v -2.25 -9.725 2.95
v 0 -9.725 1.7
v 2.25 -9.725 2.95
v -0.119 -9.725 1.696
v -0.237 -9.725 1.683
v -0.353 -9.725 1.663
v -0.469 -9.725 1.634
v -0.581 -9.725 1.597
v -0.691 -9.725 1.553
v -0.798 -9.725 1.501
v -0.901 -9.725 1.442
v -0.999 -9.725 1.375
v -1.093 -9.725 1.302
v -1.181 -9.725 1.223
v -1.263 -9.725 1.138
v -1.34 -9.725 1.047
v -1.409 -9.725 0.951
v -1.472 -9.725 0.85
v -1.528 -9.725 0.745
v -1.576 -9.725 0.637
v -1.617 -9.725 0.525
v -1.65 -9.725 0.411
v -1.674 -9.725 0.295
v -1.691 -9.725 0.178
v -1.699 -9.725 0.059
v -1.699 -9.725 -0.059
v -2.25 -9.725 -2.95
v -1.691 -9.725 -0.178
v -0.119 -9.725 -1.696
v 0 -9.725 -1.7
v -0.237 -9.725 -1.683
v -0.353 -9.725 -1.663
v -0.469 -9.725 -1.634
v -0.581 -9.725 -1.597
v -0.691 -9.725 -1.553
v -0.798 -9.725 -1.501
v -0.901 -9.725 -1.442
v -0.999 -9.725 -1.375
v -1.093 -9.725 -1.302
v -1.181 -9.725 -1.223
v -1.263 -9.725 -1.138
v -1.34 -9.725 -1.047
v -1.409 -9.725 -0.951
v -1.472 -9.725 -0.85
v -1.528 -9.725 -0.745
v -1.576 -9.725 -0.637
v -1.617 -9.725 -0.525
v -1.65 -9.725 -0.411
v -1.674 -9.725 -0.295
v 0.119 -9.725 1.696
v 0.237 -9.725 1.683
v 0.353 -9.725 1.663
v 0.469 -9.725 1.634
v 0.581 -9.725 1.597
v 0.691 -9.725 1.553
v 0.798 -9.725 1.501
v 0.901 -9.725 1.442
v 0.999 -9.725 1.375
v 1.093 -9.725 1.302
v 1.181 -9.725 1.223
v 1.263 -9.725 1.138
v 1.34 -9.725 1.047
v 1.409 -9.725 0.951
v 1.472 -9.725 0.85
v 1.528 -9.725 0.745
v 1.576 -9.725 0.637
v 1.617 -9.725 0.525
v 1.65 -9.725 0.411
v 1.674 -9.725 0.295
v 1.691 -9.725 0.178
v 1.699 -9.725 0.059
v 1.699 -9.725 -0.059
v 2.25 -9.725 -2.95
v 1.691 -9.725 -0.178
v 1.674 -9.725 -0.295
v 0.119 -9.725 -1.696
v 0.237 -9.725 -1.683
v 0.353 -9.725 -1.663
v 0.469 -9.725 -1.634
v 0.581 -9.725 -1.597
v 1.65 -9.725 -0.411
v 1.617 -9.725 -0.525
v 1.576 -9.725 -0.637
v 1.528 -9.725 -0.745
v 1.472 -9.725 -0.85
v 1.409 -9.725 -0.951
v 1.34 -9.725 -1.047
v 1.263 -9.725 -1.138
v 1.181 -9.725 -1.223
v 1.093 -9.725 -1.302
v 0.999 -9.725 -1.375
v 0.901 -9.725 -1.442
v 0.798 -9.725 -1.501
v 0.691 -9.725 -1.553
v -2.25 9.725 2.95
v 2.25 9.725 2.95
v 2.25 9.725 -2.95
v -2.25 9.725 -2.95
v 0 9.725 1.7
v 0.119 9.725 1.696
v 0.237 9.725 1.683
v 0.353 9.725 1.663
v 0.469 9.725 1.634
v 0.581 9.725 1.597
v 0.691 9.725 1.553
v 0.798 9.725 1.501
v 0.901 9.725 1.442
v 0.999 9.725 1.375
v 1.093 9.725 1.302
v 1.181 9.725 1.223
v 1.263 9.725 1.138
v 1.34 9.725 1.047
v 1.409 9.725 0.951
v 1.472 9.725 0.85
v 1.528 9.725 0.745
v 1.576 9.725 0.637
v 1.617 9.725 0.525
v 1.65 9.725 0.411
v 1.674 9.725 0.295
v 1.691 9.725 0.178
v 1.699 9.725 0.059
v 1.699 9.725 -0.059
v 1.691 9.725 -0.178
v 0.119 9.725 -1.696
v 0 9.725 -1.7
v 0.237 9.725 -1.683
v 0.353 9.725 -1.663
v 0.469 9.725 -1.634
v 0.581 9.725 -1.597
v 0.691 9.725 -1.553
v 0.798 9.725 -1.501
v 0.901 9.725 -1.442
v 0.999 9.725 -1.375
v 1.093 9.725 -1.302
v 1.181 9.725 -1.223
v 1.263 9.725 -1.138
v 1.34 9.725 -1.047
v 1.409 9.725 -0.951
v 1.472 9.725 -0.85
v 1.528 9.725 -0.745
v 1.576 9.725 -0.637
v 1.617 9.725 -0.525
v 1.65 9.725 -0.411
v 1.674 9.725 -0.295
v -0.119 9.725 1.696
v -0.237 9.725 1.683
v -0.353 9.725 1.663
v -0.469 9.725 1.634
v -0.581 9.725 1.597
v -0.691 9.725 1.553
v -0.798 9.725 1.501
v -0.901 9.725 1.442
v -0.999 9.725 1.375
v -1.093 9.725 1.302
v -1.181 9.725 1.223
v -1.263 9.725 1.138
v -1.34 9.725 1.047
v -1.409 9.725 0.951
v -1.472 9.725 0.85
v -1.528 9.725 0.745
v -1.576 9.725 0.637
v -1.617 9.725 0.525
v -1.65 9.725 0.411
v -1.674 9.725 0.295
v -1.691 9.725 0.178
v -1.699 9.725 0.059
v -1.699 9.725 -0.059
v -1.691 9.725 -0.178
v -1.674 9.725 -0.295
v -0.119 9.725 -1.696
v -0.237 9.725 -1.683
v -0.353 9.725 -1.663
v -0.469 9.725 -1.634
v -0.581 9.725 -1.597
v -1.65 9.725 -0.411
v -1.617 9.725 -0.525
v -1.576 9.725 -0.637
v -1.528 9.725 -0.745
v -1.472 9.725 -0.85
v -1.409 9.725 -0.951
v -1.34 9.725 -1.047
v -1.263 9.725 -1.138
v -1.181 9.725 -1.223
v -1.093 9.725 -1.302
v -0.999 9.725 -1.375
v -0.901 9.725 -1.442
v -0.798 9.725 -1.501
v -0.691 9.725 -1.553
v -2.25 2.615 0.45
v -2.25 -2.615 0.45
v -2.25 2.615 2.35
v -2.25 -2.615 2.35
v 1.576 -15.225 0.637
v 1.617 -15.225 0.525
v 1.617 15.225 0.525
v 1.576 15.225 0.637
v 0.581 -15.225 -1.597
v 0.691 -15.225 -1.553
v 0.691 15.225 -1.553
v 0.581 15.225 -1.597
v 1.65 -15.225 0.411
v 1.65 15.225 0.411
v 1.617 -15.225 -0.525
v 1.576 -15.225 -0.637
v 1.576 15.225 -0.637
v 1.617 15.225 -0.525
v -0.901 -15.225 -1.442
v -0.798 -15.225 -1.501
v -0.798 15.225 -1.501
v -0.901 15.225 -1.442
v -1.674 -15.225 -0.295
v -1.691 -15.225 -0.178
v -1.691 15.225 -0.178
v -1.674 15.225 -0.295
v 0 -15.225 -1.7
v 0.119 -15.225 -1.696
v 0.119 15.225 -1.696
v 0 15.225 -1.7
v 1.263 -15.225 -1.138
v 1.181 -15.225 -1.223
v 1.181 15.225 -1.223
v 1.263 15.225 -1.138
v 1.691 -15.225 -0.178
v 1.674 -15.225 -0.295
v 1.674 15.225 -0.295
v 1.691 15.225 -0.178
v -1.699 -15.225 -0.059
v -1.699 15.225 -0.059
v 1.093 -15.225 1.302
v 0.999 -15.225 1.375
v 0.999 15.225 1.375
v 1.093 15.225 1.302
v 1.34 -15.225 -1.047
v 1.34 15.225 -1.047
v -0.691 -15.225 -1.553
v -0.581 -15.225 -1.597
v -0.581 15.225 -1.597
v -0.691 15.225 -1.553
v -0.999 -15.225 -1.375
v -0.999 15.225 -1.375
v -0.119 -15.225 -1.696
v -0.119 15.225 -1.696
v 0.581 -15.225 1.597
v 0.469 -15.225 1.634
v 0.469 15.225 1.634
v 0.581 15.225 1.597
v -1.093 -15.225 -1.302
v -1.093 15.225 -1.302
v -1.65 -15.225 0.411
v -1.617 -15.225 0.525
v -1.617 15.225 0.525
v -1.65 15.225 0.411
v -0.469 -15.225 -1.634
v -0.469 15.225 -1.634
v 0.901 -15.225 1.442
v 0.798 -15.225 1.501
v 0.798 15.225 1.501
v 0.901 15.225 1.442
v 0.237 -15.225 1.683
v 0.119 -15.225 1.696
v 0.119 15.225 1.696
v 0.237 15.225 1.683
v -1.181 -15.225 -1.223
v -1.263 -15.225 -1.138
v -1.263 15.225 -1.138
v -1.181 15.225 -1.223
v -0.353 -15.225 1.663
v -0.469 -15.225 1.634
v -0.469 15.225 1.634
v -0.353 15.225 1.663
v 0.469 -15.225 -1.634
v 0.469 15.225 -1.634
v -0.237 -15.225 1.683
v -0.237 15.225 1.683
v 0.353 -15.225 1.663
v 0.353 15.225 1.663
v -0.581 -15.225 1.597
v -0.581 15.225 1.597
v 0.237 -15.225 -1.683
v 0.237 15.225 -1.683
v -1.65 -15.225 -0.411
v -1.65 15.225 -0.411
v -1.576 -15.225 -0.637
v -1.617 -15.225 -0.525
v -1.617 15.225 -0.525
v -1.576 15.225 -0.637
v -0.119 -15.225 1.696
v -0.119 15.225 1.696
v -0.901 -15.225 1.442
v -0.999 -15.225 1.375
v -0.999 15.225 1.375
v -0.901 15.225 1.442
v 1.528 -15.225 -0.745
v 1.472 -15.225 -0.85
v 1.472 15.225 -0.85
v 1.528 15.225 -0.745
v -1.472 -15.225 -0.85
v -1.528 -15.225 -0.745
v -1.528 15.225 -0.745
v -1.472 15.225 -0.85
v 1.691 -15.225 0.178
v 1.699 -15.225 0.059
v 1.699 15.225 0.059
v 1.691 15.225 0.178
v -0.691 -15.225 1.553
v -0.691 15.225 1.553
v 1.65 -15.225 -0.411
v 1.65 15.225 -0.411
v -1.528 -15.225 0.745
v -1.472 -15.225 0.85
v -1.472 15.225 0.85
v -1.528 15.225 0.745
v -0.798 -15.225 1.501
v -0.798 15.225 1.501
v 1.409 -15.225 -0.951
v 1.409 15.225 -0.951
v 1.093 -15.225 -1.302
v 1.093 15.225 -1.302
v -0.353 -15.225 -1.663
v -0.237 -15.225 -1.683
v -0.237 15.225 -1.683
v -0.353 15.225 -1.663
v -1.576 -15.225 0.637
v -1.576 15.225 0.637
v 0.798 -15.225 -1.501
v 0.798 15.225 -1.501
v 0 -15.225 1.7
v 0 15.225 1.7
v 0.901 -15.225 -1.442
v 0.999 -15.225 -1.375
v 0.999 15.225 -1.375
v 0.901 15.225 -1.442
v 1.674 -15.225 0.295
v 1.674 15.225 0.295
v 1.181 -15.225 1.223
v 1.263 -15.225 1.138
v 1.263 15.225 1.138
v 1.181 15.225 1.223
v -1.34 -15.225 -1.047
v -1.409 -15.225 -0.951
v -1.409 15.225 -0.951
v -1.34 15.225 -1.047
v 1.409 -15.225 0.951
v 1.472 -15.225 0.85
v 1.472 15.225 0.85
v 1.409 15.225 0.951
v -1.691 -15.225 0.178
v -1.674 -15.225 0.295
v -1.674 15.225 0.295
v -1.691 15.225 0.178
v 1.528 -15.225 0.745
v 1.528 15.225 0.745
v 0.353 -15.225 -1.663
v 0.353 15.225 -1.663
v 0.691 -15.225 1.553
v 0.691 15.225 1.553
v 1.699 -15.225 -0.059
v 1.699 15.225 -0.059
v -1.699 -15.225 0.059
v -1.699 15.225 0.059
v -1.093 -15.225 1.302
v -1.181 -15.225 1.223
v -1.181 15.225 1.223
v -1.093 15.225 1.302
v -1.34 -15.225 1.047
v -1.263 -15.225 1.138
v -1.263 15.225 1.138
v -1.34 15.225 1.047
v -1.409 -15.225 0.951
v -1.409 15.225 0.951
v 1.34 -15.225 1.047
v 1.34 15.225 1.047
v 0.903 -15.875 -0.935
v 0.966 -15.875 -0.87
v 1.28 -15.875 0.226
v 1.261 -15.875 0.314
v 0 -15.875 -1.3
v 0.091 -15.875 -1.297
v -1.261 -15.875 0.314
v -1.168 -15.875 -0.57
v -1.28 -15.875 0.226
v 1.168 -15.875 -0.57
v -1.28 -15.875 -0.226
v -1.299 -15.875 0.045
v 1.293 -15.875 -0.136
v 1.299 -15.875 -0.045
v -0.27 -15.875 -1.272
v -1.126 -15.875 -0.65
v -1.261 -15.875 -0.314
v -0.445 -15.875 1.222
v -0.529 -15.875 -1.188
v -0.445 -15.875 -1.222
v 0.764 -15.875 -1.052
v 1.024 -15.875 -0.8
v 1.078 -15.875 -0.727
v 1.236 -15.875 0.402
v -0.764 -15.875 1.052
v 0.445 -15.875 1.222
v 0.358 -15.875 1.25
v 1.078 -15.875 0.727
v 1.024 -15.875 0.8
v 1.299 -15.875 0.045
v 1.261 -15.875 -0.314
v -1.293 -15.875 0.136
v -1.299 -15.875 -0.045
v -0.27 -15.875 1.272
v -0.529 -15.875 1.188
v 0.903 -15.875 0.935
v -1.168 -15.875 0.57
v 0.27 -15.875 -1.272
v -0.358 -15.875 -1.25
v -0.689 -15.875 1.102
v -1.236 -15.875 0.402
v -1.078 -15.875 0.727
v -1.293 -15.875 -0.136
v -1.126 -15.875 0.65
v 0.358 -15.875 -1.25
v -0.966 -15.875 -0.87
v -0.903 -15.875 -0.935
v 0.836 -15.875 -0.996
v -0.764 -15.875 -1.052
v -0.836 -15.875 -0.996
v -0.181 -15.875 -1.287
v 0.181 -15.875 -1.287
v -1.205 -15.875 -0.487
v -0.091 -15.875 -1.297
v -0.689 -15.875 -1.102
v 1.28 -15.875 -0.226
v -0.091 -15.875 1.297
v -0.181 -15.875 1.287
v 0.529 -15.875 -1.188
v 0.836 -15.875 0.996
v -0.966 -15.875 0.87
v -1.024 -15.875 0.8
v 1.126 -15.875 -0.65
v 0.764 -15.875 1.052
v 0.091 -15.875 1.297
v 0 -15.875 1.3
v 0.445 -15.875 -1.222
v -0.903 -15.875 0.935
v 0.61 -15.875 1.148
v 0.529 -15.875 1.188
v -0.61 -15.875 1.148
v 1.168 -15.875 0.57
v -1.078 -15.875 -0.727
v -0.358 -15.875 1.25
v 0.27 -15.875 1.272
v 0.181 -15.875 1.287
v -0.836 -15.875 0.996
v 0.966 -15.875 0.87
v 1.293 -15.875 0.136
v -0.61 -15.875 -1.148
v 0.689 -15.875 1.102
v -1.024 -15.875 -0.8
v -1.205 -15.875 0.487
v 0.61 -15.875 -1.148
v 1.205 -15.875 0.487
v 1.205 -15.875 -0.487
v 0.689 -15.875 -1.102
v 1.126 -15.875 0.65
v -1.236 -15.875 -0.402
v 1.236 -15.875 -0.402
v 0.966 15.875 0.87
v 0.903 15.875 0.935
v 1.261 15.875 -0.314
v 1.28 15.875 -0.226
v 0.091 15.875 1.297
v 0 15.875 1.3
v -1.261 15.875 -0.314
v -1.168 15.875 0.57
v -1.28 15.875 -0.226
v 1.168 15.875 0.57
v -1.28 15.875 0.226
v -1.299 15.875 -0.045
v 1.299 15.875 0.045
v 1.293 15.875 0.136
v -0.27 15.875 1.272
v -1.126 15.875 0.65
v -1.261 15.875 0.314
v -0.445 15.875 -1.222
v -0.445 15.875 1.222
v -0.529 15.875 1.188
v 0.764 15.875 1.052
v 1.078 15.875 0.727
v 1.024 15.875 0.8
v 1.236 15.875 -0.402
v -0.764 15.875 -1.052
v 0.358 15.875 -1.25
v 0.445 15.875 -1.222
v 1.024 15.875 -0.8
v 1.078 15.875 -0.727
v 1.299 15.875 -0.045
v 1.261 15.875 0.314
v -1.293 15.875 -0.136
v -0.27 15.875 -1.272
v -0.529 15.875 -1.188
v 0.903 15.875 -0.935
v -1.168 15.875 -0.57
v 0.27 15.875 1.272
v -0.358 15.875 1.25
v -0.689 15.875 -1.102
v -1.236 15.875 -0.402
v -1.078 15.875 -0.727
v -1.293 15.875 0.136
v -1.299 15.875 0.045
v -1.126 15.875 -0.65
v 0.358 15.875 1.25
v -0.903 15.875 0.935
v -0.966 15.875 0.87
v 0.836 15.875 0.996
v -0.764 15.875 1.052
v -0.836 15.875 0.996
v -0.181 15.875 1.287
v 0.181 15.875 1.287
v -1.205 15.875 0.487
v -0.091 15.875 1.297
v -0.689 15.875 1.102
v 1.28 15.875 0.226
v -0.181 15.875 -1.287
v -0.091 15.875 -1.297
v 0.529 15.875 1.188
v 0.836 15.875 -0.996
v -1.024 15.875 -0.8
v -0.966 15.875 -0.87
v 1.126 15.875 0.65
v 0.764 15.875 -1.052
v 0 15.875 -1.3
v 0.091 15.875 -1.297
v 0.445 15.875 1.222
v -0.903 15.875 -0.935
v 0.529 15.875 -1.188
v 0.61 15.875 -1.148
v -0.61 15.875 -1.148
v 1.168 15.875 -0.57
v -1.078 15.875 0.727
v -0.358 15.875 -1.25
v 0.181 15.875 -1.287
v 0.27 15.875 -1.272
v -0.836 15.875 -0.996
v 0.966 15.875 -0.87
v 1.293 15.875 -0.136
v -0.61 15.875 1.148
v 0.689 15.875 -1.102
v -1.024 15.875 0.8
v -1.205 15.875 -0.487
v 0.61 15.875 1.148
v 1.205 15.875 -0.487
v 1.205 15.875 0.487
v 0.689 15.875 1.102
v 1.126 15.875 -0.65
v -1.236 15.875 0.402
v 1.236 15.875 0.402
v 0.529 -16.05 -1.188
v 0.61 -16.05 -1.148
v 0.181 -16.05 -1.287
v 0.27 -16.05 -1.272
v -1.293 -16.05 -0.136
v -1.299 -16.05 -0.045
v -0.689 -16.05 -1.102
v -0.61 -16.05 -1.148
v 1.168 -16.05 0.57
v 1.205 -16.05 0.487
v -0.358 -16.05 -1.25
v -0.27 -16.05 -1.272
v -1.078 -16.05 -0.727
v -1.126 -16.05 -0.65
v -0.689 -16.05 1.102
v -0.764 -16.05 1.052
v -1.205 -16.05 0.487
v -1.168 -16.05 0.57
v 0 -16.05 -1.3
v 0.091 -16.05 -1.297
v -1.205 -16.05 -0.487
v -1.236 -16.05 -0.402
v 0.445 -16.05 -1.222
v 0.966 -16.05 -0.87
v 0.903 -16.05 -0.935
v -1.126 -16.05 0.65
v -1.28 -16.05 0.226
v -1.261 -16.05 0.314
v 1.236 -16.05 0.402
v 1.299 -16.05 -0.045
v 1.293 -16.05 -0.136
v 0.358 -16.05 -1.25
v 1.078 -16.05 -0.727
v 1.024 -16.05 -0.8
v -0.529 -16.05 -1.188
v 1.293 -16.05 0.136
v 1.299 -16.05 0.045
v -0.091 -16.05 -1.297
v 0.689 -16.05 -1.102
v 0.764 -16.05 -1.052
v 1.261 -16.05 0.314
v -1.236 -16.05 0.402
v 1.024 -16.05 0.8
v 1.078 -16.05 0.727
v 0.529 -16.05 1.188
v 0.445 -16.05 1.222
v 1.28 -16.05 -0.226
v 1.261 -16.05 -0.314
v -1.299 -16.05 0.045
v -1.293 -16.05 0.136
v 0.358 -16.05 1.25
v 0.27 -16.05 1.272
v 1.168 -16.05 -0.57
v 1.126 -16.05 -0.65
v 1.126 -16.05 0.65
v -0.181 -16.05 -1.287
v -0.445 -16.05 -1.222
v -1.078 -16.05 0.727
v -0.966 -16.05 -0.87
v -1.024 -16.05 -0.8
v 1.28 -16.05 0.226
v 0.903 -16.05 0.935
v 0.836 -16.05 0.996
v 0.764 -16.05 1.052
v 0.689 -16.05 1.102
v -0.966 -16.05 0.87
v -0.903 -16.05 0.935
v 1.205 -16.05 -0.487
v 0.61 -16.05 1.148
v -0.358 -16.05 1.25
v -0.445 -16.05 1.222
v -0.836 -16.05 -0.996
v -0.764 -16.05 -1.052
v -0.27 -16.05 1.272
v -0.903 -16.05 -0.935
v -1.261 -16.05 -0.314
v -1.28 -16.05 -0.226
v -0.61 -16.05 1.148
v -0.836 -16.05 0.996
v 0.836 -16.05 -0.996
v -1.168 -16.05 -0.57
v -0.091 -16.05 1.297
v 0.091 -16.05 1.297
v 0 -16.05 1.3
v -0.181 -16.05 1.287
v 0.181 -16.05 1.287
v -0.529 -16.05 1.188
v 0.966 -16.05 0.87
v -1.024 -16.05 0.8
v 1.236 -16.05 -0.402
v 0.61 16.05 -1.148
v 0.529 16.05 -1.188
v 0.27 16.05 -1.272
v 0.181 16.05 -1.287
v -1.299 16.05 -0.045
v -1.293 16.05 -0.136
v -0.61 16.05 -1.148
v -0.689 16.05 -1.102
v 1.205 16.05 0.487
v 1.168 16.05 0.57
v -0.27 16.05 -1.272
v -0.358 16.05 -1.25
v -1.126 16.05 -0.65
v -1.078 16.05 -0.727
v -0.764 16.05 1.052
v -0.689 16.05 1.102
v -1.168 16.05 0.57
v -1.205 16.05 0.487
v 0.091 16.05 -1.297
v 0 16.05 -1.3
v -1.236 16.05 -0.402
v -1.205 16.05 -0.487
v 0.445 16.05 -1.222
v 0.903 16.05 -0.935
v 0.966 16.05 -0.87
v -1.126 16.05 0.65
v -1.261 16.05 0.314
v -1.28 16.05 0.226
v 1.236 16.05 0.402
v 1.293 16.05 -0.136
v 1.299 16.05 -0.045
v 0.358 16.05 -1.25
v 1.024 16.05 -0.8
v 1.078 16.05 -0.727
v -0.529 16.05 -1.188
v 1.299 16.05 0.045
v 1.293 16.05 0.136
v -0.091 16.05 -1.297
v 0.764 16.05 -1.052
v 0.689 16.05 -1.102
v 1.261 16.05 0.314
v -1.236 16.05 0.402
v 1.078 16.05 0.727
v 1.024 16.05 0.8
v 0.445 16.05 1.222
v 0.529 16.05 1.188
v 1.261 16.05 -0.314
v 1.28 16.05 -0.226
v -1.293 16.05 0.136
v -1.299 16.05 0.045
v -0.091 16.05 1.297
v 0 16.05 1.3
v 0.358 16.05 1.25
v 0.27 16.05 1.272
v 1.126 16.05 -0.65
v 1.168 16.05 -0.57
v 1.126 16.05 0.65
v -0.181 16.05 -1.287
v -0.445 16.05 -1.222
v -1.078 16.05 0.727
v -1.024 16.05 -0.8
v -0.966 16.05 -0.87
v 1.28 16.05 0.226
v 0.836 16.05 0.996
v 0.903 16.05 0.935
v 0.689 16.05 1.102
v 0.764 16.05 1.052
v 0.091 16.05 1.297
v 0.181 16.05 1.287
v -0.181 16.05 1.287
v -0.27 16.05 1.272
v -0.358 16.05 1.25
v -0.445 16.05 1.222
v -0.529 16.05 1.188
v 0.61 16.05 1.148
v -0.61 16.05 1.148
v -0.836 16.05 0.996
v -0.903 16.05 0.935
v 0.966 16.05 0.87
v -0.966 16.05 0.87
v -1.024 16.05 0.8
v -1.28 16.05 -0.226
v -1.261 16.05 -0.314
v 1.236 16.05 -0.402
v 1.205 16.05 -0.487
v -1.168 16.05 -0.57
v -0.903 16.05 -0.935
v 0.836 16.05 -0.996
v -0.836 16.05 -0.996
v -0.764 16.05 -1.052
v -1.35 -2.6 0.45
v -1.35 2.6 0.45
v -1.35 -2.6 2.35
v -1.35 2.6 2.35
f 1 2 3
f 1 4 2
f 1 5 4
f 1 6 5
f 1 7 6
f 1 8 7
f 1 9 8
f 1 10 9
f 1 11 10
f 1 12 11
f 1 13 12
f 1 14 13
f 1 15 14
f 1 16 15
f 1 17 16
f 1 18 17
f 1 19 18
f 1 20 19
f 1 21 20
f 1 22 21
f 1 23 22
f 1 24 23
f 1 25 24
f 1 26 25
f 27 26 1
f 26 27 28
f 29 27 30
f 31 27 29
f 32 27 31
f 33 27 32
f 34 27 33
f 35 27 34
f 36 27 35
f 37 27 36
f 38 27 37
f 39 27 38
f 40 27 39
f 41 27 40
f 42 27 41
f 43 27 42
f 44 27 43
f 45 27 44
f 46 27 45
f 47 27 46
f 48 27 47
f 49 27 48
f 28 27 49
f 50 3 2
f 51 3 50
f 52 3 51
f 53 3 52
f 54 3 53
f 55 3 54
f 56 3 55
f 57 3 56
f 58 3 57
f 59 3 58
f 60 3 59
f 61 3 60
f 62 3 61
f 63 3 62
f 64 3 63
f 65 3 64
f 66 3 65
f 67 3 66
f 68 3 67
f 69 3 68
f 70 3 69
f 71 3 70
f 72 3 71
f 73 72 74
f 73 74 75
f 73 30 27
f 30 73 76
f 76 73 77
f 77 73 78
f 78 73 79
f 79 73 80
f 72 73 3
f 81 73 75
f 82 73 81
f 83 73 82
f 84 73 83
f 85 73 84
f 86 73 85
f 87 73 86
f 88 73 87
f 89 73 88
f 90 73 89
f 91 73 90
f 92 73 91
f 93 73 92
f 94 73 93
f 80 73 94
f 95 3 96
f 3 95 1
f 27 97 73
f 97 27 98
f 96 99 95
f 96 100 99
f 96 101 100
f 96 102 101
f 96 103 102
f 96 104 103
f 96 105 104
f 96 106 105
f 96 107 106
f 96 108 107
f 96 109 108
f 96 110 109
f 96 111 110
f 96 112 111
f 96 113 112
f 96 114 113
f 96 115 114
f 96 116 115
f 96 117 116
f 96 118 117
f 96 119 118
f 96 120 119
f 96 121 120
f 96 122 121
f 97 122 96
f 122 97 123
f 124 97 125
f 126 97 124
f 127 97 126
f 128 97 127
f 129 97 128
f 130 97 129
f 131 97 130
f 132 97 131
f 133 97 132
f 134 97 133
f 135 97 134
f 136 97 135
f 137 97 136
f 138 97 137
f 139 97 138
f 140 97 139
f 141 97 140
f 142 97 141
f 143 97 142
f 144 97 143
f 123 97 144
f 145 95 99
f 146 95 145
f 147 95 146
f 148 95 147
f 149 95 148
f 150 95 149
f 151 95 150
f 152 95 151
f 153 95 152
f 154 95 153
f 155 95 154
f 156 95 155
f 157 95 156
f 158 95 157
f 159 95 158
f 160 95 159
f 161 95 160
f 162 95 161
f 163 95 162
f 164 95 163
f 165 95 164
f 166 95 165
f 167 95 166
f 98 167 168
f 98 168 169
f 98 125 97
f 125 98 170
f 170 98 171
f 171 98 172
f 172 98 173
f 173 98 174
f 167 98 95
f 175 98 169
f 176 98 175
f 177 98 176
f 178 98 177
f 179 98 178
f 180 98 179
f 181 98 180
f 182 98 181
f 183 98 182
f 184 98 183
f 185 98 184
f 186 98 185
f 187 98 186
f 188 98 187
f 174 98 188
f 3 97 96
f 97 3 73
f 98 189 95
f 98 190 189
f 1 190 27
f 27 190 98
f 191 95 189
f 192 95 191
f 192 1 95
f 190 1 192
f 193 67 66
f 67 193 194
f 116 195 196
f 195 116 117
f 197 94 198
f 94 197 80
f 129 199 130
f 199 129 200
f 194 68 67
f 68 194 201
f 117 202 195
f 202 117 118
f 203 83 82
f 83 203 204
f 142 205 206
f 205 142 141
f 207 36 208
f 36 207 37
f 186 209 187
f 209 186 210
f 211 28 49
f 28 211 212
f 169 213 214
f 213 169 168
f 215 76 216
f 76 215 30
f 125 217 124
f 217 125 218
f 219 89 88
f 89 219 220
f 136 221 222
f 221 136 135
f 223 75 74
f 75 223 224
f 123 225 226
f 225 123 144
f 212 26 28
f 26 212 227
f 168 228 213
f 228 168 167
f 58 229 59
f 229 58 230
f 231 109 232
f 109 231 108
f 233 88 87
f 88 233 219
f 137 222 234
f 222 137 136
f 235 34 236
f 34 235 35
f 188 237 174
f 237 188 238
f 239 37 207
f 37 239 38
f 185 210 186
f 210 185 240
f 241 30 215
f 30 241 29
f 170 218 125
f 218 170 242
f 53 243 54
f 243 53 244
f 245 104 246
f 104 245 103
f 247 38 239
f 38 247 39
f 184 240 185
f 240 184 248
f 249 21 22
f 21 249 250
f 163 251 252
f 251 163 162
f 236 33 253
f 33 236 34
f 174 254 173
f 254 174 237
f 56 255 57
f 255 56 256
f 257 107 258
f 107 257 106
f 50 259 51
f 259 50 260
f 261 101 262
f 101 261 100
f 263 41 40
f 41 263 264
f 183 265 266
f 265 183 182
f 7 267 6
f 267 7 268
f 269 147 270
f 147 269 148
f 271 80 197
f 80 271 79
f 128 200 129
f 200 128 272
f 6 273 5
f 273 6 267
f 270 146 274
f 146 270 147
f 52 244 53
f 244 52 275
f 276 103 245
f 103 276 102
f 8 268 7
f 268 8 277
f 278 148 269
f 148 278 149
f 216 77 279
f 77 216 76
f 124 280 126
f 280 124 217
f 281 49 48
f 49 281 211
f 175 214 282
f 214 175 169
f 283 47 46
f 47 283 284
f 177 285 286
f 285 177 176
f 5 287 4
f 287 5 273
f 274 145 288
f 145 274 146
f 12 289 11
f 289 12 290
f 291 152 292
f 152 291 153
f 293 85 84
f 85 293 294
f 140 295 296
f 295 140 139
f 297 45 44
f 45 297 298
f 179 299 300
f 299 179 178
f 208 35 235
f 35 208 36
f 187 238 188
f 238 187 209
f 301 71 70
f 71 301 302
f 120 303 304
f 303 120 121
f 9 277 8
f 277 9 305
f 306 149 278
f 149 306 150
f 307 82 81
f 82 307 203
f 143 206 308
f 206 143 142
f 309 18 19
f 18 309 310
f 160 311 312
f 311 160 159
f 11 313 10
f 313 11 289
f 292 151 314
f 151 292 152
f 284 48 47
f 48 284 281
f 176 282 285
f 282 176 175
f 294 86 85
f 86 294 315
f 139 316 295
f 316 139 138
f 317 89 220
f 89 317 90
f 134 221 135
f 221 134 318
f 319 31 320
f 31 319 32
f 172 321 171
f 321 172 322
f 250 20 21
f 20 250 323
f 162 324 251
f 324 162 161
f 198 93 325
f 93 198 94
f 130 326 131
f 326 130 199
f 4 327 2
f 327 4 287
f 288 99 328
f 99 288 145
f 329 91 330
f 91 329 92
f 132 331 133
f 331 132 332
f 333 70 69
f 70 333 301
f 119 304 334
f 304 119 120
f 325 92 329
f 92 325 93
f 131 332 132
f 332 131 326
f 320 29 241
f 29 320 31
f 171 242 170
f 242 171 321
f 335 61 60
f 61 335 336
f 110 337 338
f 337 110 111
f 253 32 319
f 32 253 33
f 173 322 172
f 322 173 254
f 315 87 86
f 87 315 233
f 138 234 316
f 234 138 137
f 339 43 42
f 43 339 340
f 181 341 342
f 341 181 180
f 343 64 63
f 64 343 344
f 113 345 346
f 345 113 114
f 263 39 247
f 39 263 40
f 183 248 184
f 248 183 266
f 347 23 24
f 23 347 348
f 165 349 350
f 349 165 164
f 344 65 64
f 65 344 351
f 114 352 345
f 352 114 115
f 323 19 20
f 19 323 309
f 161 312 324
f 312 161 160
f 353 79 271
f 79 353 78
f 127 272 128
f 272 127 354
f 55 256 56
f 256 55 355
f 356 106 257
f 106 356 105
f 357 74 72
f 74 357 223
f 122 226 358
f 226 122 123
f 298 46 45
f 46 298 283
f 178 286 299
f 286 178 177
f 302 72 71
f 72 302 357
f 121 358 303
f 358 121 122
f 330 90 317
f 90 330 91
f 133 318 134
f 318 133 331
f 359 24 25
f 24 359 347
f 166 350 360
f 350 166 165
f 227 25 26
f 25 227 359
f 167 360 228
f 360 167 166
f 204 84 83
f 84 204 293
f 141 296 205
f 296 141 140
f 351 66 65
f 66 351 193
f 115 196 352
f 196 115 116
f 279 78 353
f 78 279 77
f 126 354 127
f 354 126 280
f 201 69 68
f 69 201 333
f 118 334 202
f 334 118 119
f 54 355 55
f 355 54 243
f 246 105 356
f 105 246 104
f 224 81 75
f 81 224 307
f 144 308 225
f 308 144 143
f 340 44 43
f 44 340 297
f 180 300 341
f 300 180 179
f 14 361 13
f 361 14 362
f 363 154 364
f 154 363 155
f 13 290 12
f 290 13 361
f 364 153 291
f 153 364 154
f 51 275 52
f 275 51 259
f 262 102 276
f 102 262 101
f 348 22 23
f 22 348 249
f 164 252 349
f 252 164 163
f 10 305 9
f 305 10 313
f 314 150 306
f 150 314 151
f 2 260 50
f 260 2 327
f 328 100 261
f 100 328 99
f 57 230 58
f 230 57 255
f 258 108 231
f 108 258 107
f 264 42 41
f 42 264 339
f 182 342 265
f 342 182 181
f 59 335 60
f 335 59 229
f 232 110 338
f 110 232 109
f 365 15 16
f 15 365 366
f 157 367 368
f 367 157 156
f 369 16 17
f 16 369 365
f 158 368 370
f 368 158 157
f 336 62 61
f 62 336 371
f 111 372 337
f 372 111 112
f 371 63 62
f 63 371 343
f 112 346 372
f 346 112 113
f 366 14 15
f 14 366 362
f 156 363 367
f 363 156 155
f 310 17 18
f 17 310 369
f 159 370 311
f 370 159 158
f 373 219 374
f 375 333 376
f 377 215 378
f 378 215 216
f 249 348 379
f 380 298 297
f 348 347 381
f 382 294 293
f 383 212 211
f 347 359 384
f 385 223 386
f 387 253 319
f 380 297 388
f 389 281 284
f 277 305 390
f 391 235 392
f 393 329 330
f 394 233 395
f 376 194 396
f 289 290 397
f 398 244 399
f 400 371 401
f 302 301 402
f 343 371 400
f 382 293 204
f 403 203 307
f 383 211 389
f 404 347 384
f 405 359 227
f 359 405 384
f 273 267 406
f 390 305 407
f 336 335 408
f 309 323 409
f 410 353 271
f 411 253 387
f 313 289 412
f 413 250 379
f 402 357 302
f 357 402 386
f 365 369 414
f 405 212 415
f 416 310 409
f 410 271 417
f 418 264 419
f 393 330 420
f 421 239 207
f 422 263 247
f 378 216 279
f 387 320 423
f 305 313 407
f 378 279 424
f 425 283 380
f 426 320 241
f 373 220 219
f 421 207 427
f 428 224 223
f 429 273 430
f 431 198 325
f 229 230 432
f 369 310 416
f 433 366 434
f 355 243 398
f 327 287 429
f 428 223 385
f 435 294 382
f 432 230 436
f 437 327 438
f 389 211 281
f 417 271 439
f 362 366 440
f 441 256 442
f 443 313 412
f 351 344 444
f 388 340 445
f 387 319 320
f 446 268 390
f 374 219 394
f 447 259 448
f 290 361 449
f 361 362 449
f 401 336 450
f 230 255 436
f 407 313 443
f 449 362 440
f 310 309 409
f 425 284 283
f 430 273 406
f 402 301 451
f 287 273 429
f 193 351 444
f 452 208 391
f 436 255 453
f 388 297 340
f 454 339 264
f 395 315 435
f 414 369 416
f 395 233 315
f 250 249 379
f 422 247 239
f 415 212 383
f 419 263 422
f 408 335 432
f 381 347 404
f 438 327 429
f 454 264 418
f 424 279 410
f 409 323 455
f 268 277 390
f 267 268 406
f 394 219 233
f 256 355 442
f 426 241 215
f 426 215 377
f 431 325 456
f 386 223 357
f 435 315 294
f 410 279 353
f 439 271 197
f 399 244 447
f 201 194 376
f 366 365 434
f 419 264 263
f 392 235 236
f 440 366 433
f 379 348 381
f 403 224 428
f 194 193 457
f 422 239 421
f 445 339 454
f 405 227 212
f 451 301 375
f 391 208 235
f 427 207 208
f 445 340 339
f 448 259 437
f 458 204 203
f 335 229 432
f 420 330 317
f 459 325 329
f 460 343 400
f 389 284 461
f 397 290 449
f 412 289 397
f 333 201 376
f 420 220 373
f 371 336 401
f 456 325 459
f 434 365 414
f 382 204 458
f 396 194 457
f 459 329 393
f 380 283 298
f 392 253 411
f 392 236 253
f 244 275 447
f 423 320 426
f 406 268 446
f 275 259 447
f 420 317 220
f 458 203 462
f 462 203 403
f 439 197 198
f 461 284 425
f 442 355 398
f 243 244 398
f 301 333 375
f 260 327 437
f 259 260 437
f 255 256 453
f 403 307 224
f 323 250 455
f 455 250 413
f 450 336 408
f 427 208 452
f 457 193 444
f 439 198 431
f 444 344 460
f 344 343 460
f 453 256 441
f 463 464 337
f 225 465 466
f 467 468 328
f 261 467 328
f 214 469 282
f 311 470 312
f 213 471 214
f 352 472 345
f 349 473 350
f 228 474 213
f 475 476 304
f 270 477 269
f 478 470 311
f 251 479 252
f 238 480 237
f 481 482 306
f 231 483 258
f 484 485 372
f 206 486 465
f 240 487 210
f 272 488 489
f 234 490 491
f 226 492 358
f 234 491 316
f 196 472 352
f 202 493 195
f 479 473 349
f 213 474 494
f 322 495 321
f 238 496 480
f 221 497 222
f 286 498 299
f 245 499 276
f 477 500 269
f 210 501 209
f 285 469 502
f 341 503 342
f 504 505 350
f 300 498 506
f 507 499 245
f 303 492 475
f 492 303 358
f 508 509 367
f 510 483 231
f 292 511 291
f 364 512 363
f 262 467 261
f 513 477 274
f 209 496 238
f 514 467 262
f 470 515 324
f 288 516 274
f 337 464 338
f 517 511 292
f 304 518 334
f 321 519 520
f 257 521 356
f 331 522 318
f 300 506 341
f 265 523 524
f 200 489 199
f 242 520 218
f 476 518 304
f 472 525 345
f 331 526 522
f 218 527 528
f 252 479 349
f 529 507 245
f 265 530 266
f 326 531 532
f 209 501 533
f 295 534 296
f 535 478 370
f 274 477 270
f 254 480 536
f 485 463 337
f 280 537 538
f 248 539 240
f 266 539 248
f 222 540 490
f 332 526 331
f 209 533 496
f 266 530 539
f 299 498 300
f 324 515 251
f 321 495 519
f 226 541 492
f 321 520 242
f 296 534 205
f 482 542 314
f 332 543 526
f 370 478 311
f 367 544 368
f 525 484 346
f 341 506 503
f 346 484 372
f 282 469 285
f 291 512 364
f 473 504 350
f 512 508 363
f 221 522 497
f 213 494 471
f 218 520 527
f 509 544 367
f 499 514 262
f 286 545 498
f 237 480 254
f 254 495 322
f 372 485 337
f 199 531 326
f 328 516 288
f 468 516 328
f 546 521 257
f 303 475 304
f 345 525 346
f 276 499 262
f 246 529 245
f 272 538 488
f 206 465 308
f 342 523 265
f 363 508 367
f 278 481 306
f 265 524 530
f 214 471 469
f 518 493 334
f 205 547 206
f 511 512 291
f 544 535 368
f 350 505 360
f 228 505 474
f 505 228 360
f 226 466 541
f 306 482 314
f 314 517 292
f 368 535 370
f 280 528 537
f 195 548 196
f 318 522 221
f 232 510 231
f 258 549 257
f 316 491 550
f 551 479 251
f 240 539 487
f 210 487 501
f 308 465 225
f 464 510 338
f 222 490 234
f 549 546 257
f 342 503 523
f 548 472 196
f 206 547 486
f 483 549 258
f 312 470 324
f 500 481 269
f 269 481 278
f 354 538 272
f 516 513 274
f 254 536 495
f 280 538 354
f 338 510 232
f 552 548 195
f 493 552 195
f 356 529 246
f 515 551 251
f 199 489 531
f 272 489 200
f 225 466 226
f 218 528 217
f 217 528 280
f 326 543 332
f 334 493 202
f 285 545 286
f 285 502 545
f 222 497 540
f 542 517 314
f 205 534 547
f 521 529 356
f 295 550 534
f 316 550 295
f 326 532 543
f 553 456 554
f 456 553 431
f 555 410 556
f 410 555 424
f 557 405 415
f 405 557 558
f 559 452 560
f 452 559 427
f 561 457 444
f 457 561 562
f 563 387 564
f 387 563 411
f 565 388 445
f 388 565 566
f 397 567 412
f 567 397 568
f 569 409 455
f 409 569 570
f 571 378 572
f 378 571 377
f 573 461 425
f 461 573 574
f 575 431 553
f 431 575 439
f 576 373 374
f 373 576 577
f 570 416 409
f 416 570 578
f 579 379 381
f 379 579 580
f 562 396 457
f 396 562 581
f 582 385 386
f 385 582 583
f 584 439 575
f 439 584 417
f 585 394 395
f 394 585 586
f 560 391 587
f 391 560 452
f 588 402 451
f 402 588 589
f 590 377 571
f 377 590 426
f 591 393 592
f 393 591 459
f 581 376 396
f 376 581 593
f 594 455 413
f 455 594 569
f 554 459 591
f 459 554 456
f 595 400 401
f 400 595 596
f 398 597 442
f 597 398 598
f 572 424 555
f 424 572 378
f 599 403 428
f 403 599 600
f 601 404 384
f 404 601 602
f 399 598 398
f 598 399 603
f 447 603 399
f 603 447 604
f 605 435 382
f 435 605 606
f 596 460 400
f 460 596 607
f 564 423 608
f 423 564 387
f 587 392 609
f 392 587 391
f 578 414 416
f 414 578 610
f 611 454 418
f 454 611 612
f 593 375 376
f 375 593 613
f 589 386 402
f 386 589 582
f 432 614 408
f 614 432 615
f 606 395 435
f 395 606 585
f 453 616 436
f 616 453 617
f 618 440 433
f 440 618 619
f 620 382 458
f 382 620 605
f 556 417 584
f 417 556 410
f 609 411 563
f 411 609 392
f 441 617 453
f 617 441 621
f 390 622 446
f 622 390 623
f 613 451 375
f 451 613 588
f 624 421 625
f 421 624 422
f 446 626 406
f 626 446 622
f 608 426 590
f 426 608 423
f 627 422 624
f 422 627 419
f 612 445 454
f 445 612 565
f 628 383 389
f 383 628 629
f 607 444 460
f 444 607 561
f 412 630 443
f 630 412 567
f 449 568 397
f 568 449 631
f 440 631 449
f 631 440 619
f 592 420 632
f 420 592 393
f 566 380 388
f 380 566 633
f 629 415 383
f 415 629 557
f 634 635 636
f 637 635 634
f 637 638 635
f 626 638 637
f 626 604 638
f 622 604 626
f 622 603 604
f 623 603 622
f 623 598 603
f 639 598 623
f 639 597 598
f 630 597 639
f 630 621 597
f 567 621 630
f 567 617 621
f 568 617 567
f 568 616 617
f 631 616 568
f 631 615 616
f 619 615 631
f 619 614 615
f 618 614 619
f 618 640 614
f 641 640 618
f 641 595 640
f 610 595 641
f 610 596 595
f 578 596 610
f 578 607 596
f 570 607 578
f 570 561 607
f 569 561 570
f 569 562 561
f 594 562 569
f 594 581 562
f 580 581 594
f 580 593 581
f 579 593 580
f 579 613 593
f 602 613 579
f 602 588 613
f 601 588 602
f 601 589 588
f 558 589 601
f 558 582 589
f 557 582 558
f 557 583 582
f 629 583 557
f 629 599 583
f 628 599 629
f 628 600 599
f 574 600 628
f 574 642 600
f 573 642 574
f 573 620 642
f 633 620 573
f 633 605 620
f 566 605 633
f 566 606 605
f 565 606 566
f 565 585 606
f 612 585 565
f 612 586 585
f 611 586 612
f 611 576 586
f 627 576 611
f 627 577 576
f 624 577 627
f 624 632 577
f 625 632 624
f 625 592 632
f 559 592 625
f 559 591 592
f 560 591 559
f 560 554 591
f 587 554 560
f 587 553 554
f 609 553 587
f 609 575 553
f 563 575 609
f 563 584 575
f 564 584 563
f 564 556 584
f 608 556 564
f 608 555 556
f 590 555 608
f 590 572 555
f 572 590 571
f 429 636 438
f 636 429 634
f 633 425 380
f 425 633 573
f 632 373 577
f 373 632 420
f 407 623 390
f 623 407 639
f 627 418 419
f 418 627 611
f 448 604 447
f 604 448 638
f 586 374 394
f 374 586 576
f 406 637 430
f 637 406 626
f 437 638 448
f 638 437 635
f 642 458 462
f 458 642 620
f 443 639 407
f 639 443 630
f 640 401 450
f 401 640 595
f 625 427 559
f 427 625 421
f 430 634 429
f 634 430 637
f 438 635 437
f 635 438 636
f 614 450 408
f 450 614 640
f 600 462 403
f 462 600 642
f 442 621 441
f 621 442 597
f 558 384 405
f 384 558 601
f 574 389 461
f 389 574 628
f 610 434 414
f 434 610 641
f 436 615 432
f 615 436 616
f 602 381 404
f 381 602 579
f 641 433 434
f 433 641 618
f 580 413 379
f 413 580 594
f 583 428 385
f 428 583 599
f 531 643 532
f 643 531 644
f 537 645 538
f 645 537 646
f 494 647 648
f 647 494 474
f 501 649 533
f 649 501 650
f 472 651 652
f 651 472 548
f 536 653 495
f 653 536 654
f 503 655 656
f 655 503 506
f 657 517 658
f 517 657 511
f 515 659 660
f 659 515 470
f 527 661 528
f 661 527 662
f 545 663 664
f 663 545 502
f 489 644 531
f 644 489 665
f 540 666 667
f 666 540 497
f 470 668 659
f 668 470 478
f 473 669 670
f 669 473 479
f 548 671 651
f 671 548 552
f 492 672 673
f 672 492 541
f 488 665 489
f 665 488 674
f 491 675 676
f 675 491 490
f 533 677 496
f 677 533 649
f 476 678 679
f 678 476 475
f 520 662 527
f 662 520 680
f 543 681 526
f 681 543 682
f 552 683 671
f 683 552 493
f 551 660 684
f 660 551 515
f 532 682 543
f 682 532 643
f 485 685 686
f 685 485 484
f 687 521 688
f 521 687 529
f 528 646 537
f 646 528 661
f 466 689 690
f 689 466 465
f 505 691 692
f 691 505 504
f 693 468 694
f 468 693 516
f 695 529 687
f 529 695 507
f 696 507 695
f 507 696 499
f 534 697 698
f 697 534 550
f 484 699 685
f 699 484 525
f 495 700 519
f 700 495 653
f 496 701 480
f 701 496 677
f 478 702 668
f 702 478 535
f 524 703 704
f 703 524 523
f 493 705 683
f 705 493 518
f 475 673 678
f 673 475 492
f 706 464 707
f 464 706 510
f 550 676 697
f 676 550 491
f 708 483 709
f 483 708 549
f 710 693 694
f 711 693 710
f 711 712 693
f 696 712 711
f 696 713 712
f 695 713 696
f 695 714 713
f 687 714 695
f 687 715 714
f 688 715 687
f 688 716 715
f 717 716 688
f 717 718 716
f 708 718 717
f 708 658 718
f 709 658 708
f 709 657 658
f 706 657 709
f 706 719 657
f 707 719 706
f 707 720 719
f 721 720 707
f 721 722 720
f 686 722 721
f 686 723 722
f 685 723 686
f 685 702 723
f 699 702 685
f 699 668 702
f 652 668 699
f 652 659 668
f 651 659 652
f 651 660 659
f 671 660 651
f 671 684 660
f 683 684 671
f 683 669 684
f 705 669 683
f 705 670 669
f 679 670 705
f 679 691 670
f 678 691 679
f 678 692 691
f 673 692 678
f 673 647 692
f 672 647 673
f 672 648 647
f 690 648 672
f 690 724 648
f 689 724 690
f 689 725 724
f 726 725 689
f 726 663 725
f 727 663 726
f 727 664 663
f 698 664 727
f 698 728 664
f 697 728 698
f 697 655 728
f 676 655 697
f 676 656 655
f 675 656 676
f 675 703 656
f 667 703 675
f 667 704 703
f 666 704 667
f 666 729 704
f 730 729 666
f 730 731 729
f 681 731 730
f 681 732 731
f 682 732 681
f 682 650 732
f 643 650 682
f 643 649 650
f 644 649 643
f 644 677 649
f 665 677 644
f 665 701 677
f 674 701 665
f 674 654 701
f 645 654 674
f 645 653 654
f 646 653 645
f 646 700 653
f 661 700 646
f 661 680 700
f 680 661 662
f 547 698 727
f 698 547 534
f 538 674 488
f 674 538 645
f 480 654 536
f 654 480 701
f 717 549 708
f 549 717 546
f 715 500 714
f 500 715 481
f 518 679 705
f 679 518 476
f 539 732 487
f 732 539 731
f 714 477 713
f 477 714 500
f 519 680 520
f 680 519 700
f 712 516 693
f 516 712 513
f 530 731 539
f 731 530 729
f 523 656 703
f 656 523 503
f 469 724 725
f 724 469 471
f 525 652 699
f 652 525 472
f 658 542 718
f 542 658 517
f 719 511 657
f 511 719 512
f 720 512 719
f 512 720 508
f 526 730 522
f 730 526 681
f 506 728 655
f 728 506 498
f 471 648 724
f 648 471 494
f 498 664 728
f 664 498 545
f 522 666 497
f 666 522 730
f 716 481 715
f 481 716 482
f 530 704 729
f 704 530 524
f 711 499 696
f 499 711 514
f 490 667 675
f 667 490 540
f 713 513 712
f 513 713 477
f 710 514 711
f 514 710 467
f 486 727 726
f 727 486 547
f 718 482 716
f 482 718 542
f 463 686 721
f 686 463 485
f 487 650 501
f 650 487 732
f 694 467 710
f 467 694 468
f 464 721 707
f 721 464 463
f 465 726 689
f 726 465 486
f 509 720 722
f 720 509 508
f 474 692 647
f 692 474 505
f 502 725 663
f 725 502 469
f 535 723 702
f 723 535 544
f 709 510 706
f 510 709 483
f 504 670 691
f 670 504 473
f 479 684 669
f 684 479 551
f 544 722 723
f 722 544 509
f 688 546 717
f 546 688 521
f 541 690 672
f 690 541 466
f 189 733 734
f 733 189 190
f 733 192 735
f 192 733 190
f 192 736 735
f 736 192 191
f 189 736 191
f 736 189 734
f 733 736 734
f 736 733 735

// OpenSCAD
//
//  *************************************************
//  * Essieu Avant Canon de 36 livres modèle 1780   *
//  *************************************************
//
// DE36_EAV_V1.scad
//
// Michel RIVIERE 2018 03 13
// V1

include <DE36_REF_V1.scad>;


module EAV(PR3D_Flag=0){

//  EAV_PCC Essieu arriere, donnée de l'encoche de la semelle
// 
    
//  Calculs des marges d'assemblage pour l'encoche de la semelle    
//  Pour impression3D, utilisation des caractéristiques d'impression
//  Pour 3D rendering visuel 1% de marge
//

function ENC_EAV_GrandeLargeur(SOL_BAS_GrandeLargeur,PR3D_Flag)=
PR3D_Flag ==1 
    ? (SOL_BAS_GrandeLargeur + MinEngravedDetail) 
    : (SOL_BAS_GrandeLargeur*1.02);

function ENC_EAV_PetiteLargeur(SOL_BAS_PetiteLargeur,PR3D_Flag)=
PR3D_Flag ==1 
    ? (SOL_BAS_PetiteLargeur + MinEngravedDetail) 
    : (SOL_BAS_PetiteLargeur*1.02);
    
function ENC_EAV_MargeHauteur(PR3D_Flag)=
PR3D_Flag ==1 
    ? MinEngravedDetail //Elargissement pour positionnement de pièces si elles sont séparées à l'impression
    : 0;    //pas de marge pour le visuel
    
  
EncocheSolePoints= [
[-ENC_EAV_GrandeLargeur(SOL_BAS_GrandeLargeur,PR3D_Flag)/2,-SOL_BAS_LON,0],        // 0 
[ENC_EAV_GrandeLargeur(SOL_BAS_GrandeLargeur,PR3D_Flag)/2,-SOL_BAS_LON,0],         // 1 
[ENC_EAV_PetiteLargeur(SOL_BAS_PetiteLargeur,PR3D_Flag)/2,0,0],                    // 2 
[-ENC_EAV_PetiteLargeur(SOL_BAS_PetiteLargeur,PR3D_Flag)/2,0,0],                   // 3 
[-ENC_EAV_GrandeLargeur(SOL_BAS_GrandeLargeur,PR3D_Flag)/2,-SOL_BAS_LON,SOL_HAU+ENC_EAV_MargeHauteur(PR3D_Flag)],  // 4 
[ENC_EAV_GrandeLargeur(SOL_BAS_GrandeLargeur,PR3D_Flag)/2,-SOL_BAS_LON,SOL_HAU+ENC_EAV_MargeHauteur(PR3D_Flag)],   // 5 
[ENC_EAV_PetiteLargeur(SOL_BAS_PetiteLargeur,PR3D_Flag)/2,0,SOL_HAU+ENC_EAV_MargeHauteur(PR3D_Flag)],              // 6 
[-ENC_EAV_PetiteLargeur(SOL_BAS_PetiteLargeur,PR3D_Flag)/2,0,SOL_HAU+ENC_EAV_MargeHauteur(PR3D_Flag)]];            // 7 

EncocheSoleFaces= [
[0,1,2,3],    // bottom
[4,5,1,0],    // front
[7,6,5,4],    // top
[5,6,2,1],    // right
[6,7,3,2],    // back
[7,4,0,3]];   // left


render () 
rotate([0,0,-90])
difference(){  

    union(){
    //  EAV_PCC Essieu arriere, partie centrale carrée
    //  
        cube(size=[EAV_PCC_LON,EAV_PCC_LAR,EAV_PCC_HAU],center=true);
        
    //  EAV_PCC Essieu arriere, moyeux (des deux cotés)
    //  
        rotate(a=[0,90,0])
        cylinder (h=2*EAV_AXE_LON + EAV_PCC_LON,d1= EAV_AXE_DIA,d2=EAV_AXE_DIA,center=true,$fn=Fn_sphere);
        
    //  EAV_PCC Essieu arriere, generation museau G
    //    
        translate(v=[EAV_PCC_LON/2+EAV_AXE_LON,0,0])
        rotate(a=[0,90,0])
        cylinder (h=EAV_AXEMUS_LON,d1=EAV_AXE_DIA,d2=EAV_AXEMUS_DIA,$fn=Fn_sphere);
        
    //  EAV_PCC Essieu arriere, generation museau D
    // 
        translate(v=[-EAV_PCC_LON/2-EAV_AXE_LON,0,0])
        rotate(a=[0,-90,0])
        cylinder (h=EAV_AXEMUS_LON,d1=EAV_AXE_DIA,d2=EAV_AXEMUS_DIA,$fn=Fn_sphere);
     
    //  EAV_PCC Essieu arriere, generation bord museau G
    // 
        translate(v=[EAV_PCC_LON/2+EAV_AXE_LON+EAV_AXEMUS_LON,0,0])
        rotate(a=[0,90,0])
        cylinder (h=EAV_AXEMUS_Bord,d1=EAV_AXEMUS_DIA,d2=EAV_AXEMUS_DIA,$fn=Fn_sphere);
        
    //  EAV_PCC Essieu arriere, generation bord museau D
    // 
        translate(v=[-EAV_PCC_LON/2-EAV_AXE_LON-EAV_AXEMUS_LON-EAV_AXEMUS_Bord,0,0])
        rotate(a=[0,90,0])
        cylinder (h=EAV_AXEMUS_Bord,d1=EAV_AXEMUS_DIA,d2=EAV_AXEMUS_DIA,$fn=Fn_sphere);
        }
 
    // Creusement de l'encoche pour la sole
    // C'est un polyhedre compte-tenu de la forme non parallélépipédique de la base de sole    
        
    translate([0,-SOL_OFFSETX+EAV_OFFSETX,EAV_PCC_HAU/2-SOL_HAU+EAR_OFFSETZ-EAV_OFFSETZ])
    polyhedron( EncocheSolePoints, EncocheSoleFaces );
}
}
/*Demo*/
EAV(1);
